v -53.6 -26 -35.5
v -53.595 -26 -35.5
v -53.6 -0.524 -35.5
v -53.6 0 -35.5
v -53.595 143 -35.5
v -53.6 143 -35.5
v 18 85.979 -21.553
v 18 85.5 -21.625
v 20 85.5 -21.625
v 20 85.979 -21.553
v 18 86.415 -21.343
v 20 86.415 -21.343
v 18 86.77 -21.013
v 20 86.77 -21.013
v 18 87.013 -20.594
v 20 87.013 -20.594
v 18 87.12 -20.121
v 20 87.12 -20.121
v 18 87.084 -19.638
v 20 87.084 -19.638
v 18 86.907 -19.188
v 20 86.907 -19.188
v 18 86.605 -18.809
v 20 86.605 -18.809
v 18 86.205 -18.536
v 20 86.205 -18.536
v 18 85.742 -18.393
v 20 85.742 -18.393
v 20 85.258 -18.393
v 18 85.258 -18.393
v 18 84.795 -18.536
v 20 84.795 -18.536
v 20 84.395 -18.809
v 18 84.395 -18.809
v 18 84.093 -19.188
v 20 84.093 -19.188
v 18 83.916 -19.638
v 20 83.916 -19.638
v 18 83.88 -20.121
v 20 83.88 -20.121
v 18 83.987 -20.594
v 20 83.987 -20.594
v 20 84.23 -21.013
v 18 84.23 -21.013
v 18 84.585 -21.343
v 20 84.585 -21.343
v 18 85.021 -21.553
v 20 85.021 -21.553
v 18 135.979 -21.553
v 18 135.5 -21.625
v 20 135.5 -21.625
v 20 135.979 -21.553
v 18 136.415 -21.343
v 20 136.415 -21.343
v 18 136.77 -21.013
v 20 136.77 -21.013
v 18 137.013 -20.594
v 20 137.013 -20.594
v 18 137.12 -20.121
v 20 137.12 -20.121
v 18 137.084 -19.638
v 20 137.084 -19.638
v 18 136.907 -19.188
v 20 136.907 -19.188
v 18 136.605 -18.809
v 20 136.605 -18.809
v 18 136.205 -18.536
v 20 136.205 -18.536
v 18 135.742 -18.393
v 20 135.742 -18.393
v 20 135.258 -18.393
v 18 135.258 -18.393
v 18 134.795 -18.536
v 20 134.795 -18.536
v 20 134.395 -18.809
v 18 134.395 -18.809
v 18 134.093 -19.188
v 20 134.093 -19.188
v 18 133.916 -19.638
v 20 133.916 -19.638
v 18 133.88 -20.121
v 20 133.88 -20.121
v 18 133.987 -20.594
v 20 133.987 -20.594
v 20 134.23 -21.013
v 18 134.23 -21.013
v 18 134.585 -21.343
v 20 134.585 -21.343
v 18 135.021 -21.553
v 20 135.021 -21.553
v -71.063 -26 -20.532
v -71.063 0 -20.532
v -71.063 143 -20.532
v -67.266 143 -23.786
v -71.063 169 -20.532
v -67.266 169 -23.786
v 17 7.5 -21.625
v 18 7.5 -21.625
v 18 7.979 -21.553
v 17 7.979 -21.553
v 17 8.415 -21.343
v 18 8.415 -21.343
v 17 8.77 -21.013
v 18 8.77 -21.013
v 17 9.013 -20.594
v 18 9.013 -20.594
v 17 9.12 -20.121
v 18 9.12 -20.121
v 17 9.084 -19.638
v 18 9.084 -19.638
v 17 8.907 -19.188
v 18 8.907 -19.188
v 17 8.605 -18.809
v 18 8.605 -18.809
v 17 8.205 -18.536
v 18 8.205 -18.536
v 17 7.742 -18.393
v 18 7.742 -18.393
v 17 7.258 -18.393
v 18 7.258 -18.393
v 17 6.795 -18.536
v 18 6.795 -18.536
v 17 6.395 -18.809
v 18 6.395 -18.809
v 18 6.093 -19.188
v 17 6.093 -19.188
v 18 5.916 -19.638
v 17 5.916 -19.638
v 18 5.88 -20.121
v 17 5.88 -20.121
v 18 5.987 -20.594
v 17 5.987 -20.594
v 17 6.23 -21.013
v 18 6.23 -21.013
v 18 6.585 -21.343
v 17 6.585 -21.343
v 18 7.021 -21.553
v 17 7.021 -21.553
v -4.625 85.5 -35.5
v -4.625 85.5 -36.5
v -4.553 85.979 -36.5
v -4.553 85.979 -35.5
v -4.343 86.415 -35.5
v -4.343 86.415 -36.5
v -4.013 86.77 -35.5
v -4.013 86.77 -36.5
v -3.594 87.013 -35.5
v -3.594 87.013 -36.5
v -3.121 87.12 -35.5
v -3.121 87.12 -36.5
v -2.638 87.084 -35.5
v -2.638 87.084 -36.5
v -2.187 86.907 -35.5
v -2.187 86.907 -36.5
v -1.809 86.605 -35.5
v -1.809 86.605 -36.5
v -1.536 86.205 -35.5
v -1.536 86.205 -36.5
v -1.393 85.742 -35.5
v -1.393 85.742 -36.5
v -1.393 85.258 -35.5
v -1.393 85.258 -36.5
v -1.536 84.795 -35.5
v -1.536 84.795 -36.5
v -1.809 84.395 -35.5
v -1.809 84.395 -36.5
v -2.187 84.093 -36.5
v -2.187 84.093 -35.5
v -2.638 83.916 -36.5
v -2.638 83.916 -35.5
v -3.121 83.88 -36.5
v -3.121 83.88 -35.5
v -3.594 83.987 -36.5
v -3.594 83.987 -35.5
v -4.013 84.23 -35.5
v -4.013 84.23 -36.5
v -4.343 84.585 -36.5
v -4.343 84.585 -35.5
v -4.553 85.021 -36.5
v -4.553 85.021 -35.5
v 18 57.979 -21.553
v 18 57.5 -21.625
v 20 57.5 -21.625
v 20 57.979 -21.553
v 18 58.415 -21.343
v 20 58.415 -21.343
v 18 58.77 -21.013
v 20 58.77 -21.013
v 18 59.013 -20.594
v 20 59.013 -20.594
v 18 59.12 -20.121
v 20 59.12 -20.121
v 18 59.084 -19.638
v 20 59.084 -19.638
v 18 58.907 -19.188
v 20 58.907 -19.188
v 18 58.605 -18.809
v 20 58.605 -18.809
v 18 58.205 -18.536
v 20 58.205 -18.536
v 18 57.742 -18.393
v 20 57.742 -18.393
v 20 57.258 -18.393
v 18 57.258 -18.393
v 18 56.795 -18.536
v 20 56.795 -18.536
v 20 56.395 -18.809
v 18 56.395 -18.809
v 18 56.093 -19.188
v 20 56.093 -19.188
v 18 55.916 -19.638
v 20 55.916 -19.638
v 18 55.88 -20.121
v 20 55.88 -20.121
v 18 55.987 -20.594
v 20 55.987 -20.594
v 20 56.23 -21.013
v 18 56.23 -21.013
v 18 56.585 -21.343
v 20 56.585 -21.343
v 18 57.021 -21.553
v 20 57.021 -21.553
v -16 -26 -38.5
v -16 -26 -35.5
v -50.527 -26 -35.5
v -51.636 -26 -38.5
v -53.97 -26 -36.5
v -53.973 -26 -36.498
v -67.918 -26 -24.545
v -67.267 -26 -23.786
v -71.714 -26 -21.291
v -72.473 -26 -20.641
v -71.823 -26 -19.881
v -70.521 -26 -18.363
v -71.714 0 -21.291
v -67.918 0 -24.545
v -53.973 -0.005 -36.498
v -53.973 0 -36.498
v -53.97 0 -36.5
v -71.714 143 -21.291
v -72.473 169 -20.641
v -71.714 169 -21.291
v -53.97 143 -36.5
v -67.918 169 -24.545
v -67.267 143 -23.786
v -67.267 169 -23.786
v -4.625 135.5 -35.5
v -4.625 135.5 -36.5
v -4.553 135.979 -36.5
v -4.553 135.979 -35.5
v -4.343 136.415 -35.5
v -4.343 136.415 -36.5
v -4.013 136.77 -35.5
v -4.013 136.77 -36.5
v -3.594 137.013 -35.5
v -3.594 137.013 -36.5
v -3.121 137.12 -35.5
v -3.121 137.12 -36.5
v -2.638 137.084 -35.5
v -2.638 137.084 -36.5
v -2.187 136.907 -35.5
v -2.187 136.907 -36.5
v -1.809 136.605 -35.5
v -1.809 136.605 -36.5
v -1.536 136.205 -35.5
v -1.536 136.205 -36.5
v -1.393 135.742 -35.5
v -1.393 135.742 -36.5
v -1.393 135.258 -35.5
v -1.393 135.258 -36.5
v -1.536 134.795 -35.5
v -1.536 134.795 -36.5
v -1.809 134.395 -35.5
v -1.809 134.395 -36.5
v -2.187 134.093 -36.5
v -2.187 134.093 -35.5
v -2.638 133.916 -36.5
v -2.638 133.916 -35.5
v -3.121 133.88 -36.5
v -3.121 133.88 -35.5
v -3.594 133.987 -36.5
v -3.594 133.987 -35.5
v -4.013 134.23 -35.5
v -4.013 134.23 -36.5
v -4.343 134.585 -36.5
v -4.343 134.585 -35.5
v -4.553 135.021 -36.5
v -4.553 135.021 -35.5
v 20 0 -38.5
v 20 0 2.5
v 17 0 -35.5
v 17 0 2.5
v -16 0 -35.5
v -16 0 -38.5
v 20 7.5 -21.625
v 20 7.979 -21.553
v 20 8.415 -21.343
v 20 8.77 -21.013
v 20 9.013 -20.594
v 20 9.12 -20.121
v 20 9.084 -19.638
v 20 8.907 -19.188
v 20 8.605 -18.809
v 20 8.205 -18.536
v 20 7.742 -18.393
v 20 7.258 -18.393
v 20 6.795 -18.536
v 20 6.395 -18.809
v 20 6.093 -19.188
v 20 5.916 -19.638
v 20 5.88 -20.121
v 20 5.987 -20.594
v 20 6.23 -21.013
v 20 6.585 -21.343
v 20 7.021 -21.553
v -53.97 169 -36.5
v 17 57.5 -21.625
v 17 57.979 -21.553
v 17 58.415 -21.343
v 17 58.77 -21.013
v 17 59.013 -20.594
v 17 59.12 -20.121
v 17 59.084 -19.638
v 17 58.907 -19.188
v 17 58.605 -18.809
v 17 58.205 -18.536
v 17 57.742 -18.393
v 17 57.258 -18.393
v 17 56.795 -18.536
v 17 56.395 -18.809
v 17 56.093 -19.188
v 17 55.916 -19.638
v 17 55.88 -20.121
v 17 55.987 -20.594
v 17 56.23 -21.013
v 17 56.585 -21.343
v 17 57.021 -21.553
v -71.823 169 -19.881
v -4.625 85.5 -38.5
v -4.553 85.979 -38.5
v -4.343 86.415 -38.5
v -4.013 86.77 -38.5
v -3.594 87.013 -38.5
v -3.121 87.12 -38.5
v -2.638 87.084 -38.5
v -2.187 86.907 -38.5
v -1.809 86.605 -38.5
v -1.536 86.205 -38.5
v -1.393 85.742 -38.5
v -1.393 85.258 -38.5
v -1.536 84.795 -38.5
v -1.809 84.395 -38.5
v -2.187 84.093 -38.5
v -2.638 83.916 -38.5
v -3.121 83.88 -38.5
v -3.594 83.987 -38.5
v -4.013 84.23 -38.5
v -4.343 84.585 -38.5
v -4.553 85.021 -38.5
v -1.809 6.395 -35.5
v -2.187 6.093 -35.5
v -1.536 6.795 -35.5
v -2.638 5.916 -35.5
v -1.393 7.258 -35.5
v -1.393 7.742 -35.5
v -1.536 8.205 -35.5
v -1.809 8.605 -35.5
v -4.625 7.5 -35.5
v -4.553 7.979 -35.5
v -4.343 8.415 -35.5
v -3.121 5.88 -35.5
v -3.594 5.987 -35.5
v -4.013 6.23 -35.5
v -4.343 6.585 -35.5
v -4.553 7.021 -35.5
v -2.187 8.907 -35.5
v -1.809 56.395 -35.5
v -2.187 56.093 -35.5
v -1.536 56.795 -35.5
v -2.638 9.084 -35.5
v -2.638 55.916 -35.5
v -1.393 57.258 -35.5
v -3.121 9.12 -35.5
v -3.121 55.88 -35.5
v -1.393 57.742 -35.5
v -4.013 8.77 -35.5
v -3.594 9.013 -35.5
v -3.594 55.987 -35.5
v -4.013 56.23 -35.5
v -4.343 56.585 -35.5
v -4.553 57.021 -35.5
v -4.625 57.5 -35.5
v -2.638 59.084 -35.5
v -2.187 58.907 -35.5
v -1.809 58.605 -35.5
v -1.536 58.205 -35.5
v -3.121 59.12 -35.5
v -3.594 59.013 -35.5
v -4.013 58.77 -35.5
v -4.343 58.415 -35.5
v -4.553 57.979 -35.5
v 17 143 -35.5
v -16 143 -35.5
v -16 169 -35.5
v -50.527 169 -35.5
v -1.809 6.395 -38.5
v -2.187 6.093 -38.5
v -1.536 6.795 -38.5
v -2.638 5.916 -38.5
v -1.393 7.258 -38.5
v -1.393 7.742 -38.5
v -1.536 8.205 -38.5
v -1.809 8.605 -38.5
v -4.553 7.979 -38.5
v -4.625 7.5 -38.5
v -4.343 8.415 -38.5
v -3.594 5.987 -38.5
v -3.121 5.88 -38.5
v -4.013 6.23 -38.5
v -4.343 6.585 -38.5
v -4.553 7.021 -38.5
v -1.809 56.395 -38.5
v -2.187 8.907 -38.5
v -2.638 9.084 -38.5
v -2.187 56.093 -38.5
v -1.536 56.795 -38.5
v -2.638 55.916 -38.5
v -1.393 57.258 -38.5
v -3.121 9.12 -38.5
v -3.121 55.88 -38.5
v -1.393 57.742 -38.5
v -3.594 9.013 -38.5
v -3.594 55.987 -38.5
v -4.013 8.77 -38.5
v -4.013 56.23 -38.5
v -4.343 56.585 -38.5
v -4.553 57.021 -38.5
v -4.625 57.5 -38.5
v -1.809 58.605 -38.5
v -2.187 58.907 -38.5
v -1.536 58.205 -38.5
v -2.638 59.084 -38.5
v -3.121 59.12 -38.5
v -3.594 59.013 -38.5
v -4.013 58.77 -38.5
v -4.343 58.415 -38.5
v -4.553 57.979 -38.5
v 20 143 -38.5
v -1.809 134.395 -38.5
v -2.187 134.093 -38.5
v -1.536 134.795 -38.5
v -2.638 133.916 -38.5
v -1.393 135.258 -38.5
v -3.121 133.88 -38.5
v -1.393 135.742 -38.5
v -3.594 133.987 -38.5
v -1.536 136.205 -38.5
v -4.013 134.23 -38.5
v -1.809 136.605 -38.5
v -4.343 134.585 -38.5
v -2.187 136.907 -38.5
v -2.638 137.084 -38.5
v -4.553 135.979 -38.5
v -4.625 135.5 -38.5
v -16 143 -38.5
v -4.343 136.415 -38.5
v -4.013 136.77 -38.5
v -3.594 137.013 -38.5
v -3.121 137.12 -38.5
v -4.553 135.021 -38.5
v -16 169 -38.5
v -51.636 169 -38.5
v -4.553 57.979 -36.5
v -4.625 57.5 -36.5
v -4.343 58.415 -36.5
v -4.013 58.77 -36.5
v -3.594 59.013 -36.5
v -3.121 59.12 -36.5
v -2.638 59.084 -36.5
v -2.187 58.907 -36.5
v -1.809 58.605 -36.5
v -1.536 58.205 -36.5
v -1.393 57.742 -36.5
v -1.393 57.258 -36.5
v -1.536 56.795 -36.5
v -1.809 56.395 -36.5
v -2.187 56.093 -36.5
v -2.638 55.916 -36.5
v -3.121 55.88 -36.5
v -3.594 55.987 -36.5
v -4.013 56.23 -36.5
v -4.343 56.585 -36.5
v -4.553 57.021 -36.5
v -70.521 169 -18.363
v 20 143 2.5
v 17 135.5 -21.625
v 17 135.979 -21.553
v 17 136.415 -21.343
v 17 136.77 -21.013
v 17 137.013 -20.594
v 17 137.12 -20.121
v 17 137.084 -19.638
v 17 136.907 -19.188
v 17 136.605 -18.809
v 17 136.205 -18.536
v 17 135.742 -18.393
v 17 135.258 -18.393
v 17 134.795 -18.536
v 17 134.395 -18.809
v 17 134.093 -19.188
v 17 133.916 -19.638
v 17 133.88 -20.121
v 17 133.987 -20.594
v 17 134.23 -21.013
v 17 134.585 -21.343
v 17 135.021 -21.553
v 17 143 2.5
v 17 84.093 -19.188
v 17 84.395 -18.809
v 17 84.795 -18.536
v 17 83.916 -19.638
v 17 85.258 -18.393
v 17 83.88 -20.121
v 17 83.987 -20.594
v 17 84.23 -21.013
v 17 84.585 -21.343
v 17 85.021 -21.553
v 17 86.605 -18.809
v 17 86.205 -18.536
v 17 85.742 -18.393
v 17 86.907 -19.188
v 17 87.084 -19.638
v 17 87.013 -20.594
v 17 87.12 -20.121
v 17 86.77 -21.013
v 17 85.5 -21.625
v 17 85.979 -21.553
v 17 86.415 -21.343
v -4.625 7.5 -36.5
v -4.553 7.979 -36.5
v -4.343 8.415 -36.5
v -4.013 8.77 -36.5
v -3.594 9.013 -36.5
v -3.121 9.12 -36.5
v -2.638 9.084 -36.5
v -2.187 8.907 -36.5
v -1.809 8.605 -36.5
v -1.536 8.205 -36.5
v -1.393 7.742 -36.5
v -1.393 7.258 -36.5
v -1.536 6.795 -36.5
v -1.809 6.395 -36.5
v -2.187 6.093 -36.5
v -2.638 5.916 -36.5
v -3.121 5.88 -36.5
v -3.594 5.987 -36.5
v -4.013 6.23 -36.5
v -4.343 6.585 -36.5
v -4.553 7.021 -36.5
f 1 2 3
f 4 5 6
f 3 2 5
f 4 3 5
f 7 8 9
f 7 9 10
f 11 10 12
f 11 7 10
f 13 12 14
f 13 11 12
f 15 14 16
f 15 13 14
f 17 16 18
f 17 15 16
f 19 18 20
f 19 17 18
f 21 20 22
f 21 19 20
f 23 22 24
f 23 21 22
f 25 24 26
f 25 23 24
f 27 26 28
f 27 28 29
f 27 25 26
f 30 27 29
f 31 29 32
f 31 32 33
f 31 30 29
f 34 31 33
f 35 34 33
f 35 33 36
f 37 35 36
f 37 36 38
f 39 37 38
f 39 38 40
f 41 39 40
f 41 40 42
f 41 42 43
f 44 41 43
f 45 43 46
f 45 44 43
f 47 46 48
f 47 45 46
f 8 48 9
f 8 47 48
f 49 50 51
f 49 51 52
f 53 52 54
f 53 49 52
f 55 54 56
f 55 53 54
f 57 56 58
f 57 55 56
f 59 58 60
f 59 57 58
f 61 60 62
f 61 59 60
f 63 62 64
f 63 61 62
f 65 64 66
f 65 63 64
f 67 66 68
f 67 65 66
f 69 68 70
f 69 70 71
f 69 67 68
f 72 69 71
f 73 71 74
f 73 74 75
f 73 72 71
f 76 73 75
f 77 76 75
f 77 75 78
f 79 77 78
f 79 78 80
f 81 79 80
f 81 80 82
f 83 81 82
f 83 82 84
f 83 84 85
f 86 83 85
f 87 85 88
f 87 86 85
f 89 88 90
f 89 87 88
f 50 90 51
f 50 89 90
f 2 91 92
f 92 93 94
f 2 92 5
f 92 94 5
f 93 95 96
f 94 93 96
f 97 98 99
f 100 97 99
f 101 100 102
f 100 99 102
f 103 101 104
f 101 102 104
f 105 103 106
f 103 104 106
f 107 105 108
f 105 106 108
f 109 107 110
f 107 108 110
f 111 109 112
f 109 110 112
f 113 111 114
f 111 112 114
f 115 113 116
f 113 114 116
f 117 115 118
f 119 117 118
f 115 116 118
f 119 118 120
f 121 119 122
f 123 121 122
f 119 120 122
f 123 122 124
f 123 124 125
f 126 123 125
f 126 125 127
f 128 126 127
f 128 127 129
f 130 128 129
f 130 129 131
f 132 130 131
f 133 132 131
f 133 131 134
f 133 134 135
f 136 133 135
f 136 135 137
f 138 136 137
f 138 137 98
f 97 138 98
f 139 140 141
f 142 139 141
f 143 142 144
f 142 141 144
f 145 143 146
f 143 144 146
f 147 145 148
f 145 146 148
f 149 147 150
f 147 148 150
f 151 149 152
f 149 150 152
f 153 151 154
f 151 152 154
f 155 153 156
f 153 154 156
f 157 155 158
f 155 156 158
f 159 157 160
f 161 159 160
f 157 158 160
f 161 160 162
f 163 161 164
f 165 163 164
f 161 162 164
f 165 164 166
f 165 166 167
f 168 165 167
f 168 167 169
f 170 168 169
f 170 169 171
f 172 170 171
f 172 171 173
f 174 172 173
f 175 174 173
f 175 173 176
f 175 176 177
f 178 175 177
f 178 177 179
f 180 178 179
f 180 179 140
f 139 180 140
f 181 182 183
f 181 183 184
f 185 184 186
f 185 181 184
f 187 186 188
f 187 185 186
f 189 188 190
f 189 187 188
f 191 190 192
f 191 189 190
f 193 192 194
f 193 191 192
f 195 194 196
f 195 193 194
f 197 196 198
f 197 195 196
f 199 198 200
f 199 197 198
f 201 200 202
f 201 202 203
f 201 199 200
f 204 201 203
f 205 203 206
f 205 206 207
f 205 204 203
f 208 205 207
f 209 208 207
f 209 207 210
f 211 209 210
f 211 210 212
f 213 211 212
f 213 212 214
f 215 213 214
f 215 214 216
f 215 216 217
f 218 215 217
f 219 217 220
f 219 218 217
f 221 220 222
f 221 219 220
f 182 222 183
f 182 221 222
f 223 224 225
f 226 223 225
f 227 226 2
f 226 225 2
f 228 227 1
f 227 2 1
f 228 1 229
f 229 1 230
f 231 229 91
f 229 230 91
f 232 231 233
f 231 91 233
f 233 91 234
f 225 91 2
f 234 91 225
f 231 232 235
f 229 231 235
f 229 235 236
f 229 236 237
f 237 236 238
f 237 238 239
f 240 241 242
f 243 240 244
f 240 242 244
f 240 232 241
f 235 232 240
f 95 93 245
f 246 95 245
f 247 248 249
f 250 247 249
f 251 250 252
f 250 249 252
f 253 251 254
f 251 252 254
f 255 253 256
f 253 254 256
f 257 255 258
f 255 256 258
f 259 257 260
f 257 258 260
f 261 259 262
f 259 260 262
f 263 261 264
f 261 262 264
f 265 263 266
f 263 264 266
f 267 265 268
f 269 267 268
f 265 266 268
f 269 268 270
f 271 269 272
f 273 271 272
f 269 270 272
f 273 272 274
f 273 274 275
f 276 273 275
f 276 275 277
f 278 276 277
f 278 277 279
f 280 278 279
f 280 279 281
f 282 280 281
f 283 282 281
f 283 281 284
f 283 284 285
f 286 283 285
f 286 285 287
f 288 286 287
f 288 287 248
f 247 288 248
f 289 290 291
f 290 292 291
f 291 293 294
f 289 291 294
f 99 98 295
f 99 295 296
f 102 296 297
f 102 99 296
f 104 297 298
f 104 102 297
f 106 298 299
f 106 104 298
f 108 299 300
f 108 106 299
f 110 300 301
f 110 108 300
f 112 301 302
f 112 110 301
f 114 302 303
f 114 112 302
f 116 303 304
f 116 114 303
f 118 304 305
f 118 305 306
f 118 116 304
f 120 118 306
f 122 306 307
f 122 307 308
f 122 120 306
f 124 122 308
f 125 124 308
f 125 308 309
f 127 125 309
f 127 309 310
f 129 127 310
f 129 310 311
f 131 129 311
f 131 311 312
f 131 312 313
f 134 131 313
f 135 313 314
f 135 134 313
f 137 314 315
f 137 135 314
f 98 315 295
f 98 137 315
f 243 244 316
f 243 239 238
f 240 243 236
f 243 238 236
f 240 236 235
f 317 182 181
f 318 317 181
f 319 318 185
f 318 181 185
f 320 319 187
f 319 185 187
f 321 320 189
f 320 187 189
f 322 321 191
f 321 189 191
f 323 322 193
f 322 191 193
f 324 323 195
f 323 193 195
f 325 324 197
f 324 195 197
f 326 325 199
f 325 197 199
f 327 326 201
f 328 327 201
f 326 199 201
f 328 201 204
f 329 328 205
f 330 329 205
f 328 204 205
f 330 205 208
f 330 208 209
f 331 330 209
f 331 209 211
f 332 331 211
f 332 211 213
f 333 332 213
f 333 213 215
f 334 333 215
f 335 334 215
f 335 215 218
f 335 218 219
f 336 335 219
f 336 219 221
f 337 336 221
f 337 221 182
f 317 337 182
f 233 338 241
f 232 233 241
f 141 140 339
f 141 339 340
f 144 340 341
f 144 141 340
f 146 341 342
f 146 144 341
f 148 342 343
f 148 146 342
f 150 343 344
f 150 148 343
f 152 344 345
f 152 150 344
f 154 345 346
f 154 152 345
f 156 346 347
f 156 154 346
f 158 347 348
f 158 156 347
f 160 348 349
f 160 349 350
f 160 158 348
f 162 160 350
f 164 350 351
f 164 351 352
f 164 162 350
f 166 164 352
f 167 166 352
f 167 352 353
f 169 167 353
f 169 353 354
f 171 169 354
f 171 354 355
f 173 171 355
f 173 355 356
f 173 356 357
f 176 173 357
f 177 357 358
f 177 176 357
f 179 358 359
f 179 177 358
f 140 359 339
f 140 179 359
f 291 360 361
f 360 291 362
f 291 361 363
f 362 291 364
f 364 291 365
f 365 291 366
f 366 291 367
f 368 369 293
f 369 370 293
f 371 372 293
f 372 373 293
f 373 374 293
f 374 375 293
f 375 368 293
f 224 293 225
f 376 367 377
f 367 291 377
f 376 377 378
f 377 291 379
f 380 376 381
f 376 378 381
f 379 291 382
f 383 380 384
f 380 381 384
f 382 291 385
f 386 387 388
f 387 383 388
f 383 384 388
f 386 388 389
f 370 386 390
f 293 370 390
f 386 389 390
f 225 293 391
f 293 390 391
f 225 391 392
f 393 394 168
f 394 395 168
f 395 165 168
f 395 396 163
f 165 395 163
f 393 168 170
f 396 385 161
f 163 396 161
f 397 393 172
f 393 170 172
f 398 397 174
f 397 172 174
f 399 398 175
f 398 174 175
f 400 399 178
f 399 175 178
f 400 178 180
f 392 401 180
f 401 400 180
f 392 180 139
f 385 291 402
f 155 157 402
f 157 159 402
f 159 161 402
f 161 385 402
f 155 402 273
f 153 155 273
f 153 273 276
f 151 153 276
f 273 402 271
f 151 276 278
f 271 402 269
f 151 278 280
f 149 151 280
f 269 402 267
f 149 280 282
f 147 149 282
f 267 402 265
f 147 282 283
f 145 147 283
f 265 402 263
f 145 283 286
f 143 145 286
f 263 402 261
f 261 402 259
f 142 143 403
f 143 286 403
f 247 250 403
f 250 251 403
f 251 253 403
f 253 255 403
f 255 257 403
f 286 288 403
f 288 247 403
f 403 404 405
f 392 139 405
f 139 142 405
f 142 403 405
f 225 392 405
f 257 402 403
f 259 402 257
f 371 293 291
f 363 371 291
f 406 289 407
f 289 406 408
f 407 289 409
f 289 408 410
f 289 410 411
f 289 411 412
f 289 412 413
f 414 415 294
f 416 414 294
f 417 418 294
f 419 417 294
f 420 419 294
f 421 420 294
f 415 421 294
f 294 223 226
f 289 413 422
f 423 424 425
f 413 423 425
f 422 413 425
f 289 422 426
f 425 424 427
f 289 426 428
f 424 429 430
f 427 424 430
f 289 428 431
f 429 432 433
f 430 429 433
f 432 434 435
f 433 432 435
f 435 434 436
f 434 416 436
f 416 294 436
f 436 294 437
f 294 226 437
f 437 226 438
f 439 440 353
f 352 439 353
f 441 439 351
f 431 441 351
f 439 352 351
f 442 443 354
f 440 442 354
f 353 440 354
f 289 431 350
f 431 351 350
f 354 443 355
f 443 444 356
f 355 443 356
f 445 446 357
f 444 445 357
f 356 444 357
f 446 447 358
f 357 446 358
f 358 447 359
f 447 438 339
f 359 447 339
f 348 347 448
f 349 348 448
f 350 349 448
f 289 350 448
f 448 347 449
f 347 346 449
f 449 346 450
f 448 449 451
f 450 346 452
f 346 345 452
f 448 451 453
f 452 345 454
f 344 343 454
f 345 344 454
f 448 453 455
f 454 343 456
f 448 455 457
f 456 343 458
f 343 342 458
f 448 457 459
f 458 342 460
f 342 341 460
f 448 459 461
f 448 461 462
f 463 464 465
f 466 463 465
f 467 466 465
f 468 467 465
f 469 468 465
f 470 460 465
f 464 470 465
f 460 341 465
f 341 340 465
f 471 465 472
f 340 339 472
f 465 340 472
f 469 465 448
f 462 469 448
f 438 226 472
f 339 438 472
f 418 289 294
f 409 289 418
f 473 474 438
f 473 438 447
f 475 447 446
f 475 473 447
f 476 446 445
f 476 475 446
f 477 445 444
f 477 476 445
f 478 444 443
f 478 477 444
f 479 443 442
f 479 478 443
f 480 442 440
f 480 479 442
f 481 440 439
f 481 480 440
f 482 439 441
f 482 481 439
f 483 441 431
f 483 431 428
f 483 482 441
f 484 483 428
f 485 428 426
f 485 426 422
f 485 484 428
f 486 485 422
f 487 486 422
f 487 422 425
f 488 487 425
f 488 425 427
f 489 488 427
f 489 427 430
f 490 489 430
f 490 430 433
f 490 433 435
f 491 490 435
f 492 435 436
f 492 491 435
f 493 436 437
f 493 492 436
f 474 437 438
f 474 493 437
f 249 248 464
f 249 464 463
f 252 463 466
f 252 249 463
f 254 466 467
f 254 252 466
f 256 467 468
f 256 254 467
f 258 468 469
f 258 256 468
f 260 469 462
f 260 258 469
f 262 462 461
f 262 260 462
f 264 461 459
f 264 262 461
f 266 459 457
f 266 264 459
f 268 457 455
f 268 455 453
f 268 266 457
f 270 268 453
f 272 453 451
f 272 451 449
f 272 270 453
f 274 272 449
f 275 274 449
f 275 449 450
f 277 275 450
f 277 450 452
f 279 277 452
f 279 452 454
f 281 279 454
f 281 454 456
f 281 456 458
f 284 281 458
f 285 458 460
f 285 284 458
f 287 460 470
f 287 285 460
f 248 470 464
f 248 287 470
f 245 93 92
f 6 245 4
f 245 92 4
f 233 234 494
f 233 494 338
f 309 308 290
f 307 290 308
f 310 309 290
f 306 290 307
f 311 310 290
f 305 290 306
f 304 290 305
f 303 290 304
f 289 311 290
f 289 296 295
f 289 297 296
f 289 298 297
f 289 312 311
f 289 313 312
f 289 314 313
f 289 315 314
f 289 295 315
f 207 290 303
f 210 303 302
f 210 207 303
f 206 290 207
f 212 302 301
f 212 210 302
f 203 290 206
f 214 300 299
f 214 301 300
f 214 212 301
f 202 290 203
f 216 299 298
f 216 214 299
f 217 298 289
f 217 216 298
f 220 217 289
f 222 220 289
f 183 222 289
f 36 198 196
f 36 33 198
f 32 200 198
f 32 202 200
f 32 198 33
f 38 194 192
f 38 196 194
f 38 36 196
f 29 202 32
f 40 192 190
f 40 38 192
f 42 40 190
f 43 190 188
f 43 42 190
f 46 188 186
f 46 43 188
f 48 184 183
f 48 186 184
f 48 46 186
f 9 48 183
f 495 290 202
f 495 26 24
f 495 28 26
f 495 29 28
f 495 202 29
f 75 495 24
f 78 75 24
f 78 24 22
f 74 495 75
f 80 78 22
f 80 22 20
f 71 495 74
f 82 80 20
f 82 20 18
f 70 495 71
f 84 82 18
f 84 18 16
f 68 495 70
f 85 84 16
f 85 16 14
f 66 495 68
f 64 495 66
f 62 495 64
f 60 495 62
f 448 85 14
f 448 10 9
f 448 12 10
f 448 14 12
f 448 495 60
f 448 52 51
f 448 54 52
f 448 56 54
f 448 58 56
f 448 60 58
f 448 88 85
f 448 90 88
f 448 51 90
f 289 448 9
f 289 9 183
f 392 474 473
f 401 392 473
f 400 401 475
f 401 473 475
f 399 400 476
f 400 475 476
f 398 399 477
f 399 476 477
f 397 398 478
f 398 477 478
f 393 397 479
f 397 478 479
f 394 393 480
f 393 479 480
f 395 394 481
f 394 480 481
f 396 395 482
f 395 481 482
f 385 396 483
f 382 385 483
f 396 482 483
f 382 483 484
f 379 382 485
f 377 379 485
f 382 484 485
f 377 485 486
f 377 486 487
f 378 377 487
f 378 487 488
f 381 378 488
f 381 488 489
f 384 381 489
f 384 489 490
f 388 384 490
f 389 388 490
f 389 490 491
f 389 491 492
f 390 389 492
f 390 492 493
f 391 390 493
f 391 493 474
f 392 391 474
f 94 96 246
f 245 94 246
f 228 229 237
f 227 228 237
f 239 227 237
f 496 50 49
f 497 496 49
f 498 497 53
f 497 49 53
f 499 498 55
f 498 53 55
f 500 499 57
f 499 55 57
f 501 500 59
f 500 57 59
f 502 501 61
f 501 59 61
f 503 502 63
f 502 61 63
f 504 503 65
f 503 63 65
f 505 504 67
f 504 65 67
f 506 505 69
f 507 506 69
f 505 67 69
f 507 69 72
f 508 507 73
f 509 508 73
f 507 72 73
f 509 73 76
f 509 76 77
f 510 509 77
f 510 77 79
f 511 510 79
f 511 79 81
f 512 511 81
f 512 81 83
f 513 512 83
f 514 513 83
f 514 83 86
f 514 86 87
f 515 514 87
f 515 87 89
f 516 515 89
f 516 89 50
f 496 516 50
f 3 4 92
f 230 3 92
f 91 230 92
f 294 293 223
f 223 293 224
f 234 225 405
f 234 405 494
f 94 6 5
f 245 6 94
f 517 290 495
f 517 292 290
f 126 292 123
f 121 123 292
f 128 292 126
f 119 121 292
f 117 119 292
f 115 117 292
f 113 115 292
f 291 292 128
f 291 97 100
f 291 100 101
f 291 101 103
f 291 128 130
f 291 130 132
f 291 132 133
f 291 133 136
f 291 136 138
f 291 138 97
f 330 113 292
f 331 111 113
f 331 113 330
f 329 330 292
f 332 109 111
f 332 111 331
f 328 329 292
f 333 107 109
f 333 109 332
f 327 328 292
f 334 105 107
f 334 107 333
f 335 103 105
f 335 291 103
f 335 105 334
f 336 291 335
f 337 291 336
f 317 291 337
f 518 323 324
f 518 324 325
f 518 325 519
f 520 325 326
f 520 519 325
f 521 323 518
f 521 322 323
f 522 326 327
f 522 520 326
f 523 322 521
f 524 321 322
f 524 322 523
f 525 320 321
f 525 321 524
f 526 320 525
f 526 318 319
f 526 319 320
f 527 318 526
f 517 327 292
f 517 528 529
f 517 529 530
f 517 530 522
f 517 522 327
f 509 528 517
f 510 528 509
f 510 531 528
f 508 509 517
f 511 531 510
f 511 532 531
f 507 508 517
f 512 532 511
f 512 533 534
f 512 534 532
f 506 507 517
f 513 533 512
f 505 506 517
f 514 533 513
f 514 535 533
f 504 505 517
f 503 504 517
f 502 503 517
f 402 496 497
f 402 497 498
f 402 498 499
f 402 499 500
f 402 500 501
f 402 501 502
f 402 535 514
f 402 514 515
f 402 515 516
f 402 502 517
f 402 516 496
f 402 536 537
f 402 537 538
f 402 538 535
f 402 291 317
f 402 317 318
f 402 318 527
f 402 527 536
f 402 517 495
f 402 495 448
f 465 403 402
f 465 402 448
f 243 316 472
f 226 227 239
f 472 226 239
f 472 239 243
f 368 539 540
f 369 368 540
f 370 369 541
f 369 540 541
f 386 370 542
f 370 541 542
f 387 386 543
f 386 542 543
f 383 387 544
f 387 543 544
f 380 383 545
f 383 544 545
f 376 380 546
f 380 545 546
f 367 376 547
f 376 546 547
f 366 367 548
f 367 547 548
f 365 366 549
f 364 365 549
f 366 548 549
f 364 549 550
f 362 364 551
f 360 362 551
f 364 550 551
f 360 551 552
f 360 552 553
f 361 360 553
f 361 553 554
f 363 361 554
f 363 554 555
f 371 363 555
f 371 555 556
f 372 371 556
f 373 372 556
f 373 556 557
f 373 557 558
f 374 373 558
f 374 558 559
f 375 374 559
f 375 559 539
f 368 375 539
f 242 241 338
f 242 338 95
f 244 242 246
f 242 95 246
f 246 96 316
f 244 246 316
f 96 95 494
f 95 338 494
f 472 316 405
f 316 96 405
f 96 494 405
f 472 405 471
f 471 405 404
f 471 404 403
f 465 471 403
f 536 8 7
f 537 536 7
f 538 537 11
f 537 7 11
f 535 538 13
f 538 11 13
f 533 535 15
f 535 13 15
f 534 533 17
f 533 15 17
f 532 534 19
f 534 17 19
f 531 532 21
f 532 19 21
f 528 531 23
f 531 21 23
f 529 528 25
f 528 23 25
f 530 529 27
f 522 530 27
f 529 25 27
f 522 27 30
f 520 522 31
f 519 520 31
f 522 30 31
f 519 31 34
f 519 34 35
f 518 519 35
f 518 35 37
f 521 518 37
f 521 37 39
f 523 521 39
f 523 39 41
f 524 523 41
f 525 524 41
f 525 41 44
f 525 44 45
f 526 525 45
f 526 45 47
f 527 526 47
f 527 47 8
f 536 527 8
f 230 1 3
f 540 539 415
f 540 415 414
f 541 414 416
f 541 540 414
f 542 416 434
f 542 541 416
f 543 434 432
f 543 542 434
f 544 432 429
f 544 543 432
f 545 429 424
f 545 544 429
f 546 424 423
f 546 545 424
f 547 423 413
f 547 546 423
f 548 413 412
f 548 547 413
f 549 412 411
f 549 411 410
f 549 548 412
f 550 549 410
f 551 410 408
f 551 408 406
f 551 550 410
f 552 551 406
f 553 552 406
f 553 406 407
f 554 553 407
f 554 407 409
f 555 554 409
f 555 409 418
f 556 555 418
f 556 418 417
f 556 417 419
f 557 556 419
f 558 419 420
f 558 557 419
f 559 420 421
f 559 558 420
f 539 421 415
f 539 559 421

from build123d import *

# Parameters (mm, degrees)
SALIENTE_EXTRUIR1_DEPTH    = 143
CORTAR_EXTRUIR1_REACH      = 91.714
CROQUIS2_R                 = 1.625
CORTAR_EXTRUIR2_REACH      = 38.5
CROQUIS3_R                 = 1.625
CROQUIS4_W                 = 7.355559709
CROQUIS4_H                 = 144.434060974
CORTAR_EXTRUIR3_DEPTH      = 30
SALIENTE_EXTRUIR2_DEPTH    = 1
CROQUIS6_W                 = 1
CROQUIS6_H                 = 143
SALIENTE_EXTRUIR3_DEPTH    = 3.5
SALIENTE_EXTRUIR4_DEPTH    = 26
SALIENTE_EXTRUIR5_DEPTH    = 26
SALIENTE_EXTRUIR6_DEPTH    = 195
CROQUIS10_R                = 1.625
SALIENTE_EXTRUIR7_DEPTH    = 2
CORTAR_EXTRUIR4_DEPTH      = 1
CORTAR_EXTRUIR4_DEPTH_BACK = 196
CROQUIS12_W                = 41
CROQUIS12_H                = 143
CROQUIS12_R                = 1.625
SALIENTE_EXTRUIR8_DEPTH    = 2


with BuildPart() as part:
    # Croquis1 → Saliente-Extruir1 (new body)
    with BuildSketch(Plane(origin=(0, 0, 0), x_dir=(1, 0, 0), z_dir=(0, 1, 0))):
        Polygon((0, 0), (18, 0), (18, 36.5), (-53.969911232, 36.5), (-71.714014286, 21.29146431), (-71.063240069, 20.532193003), (-53.6, 35.5), (17, 35.5), (17, 1), (0, 1), align=None)
    extrude(amount=SALIENTE_EXTRUIR1_DEPTH)

    # Croquis2 → Cortar-Extruir1 (cut, up to next)
    with BuildSketch(Plane(origin=(18, 0, 0), x_dir=(0, 0, -1), z_dir=(1, 0, 0)), mode=Mode.PRIVATE) as cortar_extruir1_sk1:
        with Locations((20, 135.5)):
            Circle(CROQUIS2_R)
    cortar_extruir1_tool1 = extrude(cortar_extruir1_sk1.sketch, amount=-CORTAR_EXTRUIR1_REACH, mode=Mode.PRIVATE) & part.part
    add(cortar_extruir1_tool1.solids().sort_by_distance((18, 135.5, -20))[0], mode=Mode.SUBTRACT)
    # Croquis2 → Cortar-Extruir1 (cut, up to next)
    with BuildSketch(Plane(origin=(18, 0, 0), x_dir=(0, 0, -1), z_dir=(1, 0, 0)), mode=Mode.PRIVATE) as cortar_extruir1_sk2:
        with Locations((20, 7.5)):
            Circle(CROQUIS2_R)
    cortar_extruir1_tool2 = extrude(cortar_extruir1_sk2.sketch, amount=-CORTAR_EXTRUIR1_REACH, mode=Mode.PRIVATE) & part.part
    add(cortar_extruir1_tool2.solids().sort_by_distance((18, 7.5, -20))[0], mode=Mode.SUBTRACT)
    # Croquis2 → Cortar-Extruir1 (cut, up to next)
    with BuildSketch(Plane(origin=(18, 0, 0), x_dir=(0, 0, -1), z_dir=(1, 0, 0)), mode=Mode.PRIVATE) as cortar_extruir1_sk3:
        with Locations((20, 85.5)):
            Circle(CROQUIS2_R)
    cortar_extruir1_tool3 = extrude(cortar_extruir1_sk3.sketch, amount=-CORTAR_EXTRUIR1_REACH, mode=Mode.PRIVATE) & part.part
    add(cortar_extruir1_tool3.solids().sort_by_distance((18, 85.5, -20))[0], mode=Mode.SUBTRACT)
    # Croquis2 → Cortar-Extruir1 (cut, up to next)
    with BuildSketch(Plane(origin=(18, 0, 0), x_dir=(0, 0, -1), z_dir=(1, 0, 0)), mode=Mode.PRIVATE) as cortar_extruir1_sk4:
        with Locations((20, 57.5)):
            Circle(CROQUIS2_R)
    cortar_extruir1_tool4 = extrude(cortar_extruir1_sk4.sketch, amount=-CORTAR_EXTRUIR1_REACH, mode=Mode.PRIVATE) & part.part
    add(cortar_extruir1_tool4.solids().sort_by_distance((18, 57.5, -20))[0], mode=Mode.SUBTRACT)

    # Croquis3 → Cortar-Extruir2 (cut, up to next)
    with BuildSketch(Plane(origin=(0, 0, -36.5), x_dir=(-1, 0, 0), z_dir=(0, 0, -1)), mode=Mode.PRIVATE) as cortar_extruir2_sk1:
        with Locations((3, 7.5)):
            Circle(CROQUIS3_R)
    cortar_extruir2_tool1 = extrude(cortar_extruir2_sk1.sketch, amount=-CORTAR_EXTRUIR2_REACH, mode=Mode.PRIVATE) & part.part
    add(cortar_extruir2_tool1.solids().sort_by_distance((-3, 7.5, -36.5))[0], mode=Mode.SUBTRACT)
    # Croquis3 → Cortar-Extruir2 (cut, up to next)
    with BuildSketch(Plane(origin=(0, 0, -36.5), x_dir=(-1, 0, 0), z_dir=(0, 0, -1)), mode=Mode.PRIVATE) as cortar_extruir2_sk2:
        with Locations((3, 135.5)):
            Circle(CROQUIS3_R)
    cortar_extruir2_tool2 = extrude(cortar_extruir2_sk2.sketch, amount=-CORTAR_EXTRUIR2_REACH, mode=Mode.PRIVATE) & part.part
    add(cortar_extruir2_tool2.solids().sort_by_distance((-3, 135.5, -36.5))[0], mode=Mode.SUBTRACT)
    # Croquis3 → Cortar-Extruir2 (cut, up to next)
    with BuildSketch(Plane(origin=(0, 0, -36.5), x_dir=(-1, 0, 0), z_dir=(0, 0, -1)), mode=Mode.PRIVATE) as cortar_extruir2_sk3:
        with Locations((3, 57.5)):
            Circle(CROQUIS3_R)
    cortar_extruir2_tool3 = extrude(cortar_extruir2_sk3.sketch, amount=-CORTAR_EXTRUIR2_REACH, mode=Mode.PRIVATE) & part.part
    add(cortar_extruir2_tool3.solids().sort_by_distance((-3, 57.5, -36.5))[0], mode=Mode.SUBTRACT)
    # Croquis3 → Cortar-Extruir2 (cut, up to next)
    with BuildSketch(Plane(origin=(0, 0, -36.5), x_dir=(-1, 0, 0), z_dir=(0, 0, -1)), mode=Mode.PRIVATE) as cortar_extruir2_sk4:
        with Locations((3, 85.5)):
            Circle(CROQUIS3_R)
    cortar_extruir2_tool4 = extrude(cortar_extruir2_sk4.sketch, amount=-CORTAR_EXTRUIR2_REACH, mode=Mode.PRIVATE) & part.part
    add(cortar_extruir2_tool4.solids().sort_by_distance((-3, 85.5, -36.5))[0], mode=Mode.SUBTRACT)

    # Croquis4 → Cortar-Extruir3 (cut)
    with BuildSketch(Plane(origin=(18, 0, 0), x_dir=(0, 0, -1), z_dir=(1, 0, 0))):
        with Locations((-2.677779855, 72.217030487)):
            Rectangle(CROQUIS4_W, CROQUIS4_H)
    extrude(amount=-CORTAR_EXTRUIR3_DEPTH, mode=Mode.SUBTRACT)

    # Croquis5 → Saliente-Extruir2 (add)
    with BuildSketch(Plane(origin=(-40.891807576, 0, -47.709290524), x_dir=(-0.759271307, 0, 0.650774217), z_dir=(-0.650774217, 0, -0.759271307))):
        Polygon((17.224546128, 0), (35.59445736, -26), (40.59445736, -26), (40.59445736, 0), (17.59445736, 0), align=None)
        Polygon((40.59445736, 143), (17.59445736, 143), (17.224546128, 143), (35.59445736, 169), (40.59445736, 169), align=None)
    extrude(amount=-SALIENTE_EXTRUIR2_DEPTH)

    # Croquis6 → Saliente-Extruir3 (add)
    with BuildSketch(Plane.XY.offset(-1)):
        with Locations((17.5, 71.5)):
            Rectangle(CROQUIS6_W, CROQUIS6_H)
    extrude(amount=SALIENTE_EXTRUIR3_DEPTH)

    # Croquis7 → Saliente-Extruir4 (add)
    with BuildSketch(Plane.XZ.offset(26)):
        Polygon((-67.266883532, -23.786064089), (-67.917657749, -24.545335397), (-53.972777222, -36.497543549), (-53.969911232, -36.5), (-16, -36.5), (-16, -35.5), (-53.6, -35.5), align=None)
    extrude(amount=-SALIENTE_EXTRUIR4_DEPTH)

    # Croquis8 → Saliente-Extruir5 (add)
    with BuildSketch(Plane(origin=(0, 169, 0), x_dir=(1, 0, 0), z_dir=(0, 1, 0))):
        Polygon((-67.917657749, 24.545335397), (-53.969911232, 36.5), (-16, 36.5), (-16, 35.5), (-53.595402654, 35.5), (-67.264936524, 23.783792475), align=None)
    extrude(amount=-SALIENTE_EXTRUIR5_DEPTH)

    # Croquis9 → Saliente-Extruir6 (add)
    with BuildSketch(Plane(origin=(0, 169, 0), x_dir=(1, 0, 0), z_dir=(0, 1, 0))):
        Polygon((-71.714014286, 21.29146431), (-71.063240069, 20.532193003), (-53.595402654, 35.5), (-50.526737497, 35.5), (-70.520962942, 18.362876171), (-71.822511376, 19.881418786), (-72.473285593, 20.640690093), align=None)
    extrude(amount=-SALIENTE_EXTRUIR6_DEPTH)

    # Croquis10 → Saliente-Extruir7 (add)
    with BuildSketch(Plane(origin=(0, 0, -36.5), x_dir=(-1, 0, 0), z_dir=(0, 0, -1))):
        Polygon((-18, 0), (16, 0), (16, -26), (53.969911232, -26), (53.969911232, 169), (16, 169), (16, 143), (-18, 143), align=None)
        with Locations((3, 7.5)):
            Circle(CROQUIS10_R, mode=Mode.SUBTRACT)
        with Locations((3, 57.5)):
            Circle(CROQUIS10_R, mode=Mode.SUBTRACT)
        with Locations((3, 85.5)):
            Circle(CROQUIS10_R, mode=Mode.SUBTRACT)
        with Locations((3, 135.5)):
            Circle(CROQUIS10_R, mode=Mode.SUBTRACT)
    extrude(amount=SALIENTE_EXTRUIR7_DEPTH)

    # Croquis11 → Cortar-Extruir4 (cut, two sides)
    with BuildSketch(Plane.XZ.offset(26)) as cortar_extruir4_sk:
        Polygon((-53.969911232, -36.5), (-51.636471194, -38.5), (-54.241943892, -38.819087413), align=None)
    extrude(amount=CORTAR_EXTRUIR4_DEPTH, mode=Mode.SUBTRACT)
    extrude(cortar_extruir4_sk.sketch, amount=-CORTAR_EXTRUIR4_DEPTH_BACK, mode=Mode.SUBTRACT)

    # Croquis12 → Saliente-Extruir8 (add)
    with BuildSketch(Plane(origin=(18, 0, 0), x_dir=(0, 0, -1), z_dir=(1, 0, 0))):
        with Locations((18, 71.5)):
            Rectangle(CROQUIS12_W, CROQUIS12_H)
        with Locations((20, 7.5)):
            Circle(CROQUIS12_R, mode=Mode.SUBTRACT)
        with Locations((20, 57.5)):
            Circle(CROQUIS12_R, mode=Mode.SUBTRACT)
        with Locations((20, 85.5)):
            Circle(CROQUIS12_R, mode=Mode.SUBTRACT)
        with Locations((20, 135.5)):
            Circle(CROQUIS12_R, mode=Mode.SUBTRACT)
    extrude(amount=SALIENTE_EXTRUIR8_DEPTH)


solid = part.part
